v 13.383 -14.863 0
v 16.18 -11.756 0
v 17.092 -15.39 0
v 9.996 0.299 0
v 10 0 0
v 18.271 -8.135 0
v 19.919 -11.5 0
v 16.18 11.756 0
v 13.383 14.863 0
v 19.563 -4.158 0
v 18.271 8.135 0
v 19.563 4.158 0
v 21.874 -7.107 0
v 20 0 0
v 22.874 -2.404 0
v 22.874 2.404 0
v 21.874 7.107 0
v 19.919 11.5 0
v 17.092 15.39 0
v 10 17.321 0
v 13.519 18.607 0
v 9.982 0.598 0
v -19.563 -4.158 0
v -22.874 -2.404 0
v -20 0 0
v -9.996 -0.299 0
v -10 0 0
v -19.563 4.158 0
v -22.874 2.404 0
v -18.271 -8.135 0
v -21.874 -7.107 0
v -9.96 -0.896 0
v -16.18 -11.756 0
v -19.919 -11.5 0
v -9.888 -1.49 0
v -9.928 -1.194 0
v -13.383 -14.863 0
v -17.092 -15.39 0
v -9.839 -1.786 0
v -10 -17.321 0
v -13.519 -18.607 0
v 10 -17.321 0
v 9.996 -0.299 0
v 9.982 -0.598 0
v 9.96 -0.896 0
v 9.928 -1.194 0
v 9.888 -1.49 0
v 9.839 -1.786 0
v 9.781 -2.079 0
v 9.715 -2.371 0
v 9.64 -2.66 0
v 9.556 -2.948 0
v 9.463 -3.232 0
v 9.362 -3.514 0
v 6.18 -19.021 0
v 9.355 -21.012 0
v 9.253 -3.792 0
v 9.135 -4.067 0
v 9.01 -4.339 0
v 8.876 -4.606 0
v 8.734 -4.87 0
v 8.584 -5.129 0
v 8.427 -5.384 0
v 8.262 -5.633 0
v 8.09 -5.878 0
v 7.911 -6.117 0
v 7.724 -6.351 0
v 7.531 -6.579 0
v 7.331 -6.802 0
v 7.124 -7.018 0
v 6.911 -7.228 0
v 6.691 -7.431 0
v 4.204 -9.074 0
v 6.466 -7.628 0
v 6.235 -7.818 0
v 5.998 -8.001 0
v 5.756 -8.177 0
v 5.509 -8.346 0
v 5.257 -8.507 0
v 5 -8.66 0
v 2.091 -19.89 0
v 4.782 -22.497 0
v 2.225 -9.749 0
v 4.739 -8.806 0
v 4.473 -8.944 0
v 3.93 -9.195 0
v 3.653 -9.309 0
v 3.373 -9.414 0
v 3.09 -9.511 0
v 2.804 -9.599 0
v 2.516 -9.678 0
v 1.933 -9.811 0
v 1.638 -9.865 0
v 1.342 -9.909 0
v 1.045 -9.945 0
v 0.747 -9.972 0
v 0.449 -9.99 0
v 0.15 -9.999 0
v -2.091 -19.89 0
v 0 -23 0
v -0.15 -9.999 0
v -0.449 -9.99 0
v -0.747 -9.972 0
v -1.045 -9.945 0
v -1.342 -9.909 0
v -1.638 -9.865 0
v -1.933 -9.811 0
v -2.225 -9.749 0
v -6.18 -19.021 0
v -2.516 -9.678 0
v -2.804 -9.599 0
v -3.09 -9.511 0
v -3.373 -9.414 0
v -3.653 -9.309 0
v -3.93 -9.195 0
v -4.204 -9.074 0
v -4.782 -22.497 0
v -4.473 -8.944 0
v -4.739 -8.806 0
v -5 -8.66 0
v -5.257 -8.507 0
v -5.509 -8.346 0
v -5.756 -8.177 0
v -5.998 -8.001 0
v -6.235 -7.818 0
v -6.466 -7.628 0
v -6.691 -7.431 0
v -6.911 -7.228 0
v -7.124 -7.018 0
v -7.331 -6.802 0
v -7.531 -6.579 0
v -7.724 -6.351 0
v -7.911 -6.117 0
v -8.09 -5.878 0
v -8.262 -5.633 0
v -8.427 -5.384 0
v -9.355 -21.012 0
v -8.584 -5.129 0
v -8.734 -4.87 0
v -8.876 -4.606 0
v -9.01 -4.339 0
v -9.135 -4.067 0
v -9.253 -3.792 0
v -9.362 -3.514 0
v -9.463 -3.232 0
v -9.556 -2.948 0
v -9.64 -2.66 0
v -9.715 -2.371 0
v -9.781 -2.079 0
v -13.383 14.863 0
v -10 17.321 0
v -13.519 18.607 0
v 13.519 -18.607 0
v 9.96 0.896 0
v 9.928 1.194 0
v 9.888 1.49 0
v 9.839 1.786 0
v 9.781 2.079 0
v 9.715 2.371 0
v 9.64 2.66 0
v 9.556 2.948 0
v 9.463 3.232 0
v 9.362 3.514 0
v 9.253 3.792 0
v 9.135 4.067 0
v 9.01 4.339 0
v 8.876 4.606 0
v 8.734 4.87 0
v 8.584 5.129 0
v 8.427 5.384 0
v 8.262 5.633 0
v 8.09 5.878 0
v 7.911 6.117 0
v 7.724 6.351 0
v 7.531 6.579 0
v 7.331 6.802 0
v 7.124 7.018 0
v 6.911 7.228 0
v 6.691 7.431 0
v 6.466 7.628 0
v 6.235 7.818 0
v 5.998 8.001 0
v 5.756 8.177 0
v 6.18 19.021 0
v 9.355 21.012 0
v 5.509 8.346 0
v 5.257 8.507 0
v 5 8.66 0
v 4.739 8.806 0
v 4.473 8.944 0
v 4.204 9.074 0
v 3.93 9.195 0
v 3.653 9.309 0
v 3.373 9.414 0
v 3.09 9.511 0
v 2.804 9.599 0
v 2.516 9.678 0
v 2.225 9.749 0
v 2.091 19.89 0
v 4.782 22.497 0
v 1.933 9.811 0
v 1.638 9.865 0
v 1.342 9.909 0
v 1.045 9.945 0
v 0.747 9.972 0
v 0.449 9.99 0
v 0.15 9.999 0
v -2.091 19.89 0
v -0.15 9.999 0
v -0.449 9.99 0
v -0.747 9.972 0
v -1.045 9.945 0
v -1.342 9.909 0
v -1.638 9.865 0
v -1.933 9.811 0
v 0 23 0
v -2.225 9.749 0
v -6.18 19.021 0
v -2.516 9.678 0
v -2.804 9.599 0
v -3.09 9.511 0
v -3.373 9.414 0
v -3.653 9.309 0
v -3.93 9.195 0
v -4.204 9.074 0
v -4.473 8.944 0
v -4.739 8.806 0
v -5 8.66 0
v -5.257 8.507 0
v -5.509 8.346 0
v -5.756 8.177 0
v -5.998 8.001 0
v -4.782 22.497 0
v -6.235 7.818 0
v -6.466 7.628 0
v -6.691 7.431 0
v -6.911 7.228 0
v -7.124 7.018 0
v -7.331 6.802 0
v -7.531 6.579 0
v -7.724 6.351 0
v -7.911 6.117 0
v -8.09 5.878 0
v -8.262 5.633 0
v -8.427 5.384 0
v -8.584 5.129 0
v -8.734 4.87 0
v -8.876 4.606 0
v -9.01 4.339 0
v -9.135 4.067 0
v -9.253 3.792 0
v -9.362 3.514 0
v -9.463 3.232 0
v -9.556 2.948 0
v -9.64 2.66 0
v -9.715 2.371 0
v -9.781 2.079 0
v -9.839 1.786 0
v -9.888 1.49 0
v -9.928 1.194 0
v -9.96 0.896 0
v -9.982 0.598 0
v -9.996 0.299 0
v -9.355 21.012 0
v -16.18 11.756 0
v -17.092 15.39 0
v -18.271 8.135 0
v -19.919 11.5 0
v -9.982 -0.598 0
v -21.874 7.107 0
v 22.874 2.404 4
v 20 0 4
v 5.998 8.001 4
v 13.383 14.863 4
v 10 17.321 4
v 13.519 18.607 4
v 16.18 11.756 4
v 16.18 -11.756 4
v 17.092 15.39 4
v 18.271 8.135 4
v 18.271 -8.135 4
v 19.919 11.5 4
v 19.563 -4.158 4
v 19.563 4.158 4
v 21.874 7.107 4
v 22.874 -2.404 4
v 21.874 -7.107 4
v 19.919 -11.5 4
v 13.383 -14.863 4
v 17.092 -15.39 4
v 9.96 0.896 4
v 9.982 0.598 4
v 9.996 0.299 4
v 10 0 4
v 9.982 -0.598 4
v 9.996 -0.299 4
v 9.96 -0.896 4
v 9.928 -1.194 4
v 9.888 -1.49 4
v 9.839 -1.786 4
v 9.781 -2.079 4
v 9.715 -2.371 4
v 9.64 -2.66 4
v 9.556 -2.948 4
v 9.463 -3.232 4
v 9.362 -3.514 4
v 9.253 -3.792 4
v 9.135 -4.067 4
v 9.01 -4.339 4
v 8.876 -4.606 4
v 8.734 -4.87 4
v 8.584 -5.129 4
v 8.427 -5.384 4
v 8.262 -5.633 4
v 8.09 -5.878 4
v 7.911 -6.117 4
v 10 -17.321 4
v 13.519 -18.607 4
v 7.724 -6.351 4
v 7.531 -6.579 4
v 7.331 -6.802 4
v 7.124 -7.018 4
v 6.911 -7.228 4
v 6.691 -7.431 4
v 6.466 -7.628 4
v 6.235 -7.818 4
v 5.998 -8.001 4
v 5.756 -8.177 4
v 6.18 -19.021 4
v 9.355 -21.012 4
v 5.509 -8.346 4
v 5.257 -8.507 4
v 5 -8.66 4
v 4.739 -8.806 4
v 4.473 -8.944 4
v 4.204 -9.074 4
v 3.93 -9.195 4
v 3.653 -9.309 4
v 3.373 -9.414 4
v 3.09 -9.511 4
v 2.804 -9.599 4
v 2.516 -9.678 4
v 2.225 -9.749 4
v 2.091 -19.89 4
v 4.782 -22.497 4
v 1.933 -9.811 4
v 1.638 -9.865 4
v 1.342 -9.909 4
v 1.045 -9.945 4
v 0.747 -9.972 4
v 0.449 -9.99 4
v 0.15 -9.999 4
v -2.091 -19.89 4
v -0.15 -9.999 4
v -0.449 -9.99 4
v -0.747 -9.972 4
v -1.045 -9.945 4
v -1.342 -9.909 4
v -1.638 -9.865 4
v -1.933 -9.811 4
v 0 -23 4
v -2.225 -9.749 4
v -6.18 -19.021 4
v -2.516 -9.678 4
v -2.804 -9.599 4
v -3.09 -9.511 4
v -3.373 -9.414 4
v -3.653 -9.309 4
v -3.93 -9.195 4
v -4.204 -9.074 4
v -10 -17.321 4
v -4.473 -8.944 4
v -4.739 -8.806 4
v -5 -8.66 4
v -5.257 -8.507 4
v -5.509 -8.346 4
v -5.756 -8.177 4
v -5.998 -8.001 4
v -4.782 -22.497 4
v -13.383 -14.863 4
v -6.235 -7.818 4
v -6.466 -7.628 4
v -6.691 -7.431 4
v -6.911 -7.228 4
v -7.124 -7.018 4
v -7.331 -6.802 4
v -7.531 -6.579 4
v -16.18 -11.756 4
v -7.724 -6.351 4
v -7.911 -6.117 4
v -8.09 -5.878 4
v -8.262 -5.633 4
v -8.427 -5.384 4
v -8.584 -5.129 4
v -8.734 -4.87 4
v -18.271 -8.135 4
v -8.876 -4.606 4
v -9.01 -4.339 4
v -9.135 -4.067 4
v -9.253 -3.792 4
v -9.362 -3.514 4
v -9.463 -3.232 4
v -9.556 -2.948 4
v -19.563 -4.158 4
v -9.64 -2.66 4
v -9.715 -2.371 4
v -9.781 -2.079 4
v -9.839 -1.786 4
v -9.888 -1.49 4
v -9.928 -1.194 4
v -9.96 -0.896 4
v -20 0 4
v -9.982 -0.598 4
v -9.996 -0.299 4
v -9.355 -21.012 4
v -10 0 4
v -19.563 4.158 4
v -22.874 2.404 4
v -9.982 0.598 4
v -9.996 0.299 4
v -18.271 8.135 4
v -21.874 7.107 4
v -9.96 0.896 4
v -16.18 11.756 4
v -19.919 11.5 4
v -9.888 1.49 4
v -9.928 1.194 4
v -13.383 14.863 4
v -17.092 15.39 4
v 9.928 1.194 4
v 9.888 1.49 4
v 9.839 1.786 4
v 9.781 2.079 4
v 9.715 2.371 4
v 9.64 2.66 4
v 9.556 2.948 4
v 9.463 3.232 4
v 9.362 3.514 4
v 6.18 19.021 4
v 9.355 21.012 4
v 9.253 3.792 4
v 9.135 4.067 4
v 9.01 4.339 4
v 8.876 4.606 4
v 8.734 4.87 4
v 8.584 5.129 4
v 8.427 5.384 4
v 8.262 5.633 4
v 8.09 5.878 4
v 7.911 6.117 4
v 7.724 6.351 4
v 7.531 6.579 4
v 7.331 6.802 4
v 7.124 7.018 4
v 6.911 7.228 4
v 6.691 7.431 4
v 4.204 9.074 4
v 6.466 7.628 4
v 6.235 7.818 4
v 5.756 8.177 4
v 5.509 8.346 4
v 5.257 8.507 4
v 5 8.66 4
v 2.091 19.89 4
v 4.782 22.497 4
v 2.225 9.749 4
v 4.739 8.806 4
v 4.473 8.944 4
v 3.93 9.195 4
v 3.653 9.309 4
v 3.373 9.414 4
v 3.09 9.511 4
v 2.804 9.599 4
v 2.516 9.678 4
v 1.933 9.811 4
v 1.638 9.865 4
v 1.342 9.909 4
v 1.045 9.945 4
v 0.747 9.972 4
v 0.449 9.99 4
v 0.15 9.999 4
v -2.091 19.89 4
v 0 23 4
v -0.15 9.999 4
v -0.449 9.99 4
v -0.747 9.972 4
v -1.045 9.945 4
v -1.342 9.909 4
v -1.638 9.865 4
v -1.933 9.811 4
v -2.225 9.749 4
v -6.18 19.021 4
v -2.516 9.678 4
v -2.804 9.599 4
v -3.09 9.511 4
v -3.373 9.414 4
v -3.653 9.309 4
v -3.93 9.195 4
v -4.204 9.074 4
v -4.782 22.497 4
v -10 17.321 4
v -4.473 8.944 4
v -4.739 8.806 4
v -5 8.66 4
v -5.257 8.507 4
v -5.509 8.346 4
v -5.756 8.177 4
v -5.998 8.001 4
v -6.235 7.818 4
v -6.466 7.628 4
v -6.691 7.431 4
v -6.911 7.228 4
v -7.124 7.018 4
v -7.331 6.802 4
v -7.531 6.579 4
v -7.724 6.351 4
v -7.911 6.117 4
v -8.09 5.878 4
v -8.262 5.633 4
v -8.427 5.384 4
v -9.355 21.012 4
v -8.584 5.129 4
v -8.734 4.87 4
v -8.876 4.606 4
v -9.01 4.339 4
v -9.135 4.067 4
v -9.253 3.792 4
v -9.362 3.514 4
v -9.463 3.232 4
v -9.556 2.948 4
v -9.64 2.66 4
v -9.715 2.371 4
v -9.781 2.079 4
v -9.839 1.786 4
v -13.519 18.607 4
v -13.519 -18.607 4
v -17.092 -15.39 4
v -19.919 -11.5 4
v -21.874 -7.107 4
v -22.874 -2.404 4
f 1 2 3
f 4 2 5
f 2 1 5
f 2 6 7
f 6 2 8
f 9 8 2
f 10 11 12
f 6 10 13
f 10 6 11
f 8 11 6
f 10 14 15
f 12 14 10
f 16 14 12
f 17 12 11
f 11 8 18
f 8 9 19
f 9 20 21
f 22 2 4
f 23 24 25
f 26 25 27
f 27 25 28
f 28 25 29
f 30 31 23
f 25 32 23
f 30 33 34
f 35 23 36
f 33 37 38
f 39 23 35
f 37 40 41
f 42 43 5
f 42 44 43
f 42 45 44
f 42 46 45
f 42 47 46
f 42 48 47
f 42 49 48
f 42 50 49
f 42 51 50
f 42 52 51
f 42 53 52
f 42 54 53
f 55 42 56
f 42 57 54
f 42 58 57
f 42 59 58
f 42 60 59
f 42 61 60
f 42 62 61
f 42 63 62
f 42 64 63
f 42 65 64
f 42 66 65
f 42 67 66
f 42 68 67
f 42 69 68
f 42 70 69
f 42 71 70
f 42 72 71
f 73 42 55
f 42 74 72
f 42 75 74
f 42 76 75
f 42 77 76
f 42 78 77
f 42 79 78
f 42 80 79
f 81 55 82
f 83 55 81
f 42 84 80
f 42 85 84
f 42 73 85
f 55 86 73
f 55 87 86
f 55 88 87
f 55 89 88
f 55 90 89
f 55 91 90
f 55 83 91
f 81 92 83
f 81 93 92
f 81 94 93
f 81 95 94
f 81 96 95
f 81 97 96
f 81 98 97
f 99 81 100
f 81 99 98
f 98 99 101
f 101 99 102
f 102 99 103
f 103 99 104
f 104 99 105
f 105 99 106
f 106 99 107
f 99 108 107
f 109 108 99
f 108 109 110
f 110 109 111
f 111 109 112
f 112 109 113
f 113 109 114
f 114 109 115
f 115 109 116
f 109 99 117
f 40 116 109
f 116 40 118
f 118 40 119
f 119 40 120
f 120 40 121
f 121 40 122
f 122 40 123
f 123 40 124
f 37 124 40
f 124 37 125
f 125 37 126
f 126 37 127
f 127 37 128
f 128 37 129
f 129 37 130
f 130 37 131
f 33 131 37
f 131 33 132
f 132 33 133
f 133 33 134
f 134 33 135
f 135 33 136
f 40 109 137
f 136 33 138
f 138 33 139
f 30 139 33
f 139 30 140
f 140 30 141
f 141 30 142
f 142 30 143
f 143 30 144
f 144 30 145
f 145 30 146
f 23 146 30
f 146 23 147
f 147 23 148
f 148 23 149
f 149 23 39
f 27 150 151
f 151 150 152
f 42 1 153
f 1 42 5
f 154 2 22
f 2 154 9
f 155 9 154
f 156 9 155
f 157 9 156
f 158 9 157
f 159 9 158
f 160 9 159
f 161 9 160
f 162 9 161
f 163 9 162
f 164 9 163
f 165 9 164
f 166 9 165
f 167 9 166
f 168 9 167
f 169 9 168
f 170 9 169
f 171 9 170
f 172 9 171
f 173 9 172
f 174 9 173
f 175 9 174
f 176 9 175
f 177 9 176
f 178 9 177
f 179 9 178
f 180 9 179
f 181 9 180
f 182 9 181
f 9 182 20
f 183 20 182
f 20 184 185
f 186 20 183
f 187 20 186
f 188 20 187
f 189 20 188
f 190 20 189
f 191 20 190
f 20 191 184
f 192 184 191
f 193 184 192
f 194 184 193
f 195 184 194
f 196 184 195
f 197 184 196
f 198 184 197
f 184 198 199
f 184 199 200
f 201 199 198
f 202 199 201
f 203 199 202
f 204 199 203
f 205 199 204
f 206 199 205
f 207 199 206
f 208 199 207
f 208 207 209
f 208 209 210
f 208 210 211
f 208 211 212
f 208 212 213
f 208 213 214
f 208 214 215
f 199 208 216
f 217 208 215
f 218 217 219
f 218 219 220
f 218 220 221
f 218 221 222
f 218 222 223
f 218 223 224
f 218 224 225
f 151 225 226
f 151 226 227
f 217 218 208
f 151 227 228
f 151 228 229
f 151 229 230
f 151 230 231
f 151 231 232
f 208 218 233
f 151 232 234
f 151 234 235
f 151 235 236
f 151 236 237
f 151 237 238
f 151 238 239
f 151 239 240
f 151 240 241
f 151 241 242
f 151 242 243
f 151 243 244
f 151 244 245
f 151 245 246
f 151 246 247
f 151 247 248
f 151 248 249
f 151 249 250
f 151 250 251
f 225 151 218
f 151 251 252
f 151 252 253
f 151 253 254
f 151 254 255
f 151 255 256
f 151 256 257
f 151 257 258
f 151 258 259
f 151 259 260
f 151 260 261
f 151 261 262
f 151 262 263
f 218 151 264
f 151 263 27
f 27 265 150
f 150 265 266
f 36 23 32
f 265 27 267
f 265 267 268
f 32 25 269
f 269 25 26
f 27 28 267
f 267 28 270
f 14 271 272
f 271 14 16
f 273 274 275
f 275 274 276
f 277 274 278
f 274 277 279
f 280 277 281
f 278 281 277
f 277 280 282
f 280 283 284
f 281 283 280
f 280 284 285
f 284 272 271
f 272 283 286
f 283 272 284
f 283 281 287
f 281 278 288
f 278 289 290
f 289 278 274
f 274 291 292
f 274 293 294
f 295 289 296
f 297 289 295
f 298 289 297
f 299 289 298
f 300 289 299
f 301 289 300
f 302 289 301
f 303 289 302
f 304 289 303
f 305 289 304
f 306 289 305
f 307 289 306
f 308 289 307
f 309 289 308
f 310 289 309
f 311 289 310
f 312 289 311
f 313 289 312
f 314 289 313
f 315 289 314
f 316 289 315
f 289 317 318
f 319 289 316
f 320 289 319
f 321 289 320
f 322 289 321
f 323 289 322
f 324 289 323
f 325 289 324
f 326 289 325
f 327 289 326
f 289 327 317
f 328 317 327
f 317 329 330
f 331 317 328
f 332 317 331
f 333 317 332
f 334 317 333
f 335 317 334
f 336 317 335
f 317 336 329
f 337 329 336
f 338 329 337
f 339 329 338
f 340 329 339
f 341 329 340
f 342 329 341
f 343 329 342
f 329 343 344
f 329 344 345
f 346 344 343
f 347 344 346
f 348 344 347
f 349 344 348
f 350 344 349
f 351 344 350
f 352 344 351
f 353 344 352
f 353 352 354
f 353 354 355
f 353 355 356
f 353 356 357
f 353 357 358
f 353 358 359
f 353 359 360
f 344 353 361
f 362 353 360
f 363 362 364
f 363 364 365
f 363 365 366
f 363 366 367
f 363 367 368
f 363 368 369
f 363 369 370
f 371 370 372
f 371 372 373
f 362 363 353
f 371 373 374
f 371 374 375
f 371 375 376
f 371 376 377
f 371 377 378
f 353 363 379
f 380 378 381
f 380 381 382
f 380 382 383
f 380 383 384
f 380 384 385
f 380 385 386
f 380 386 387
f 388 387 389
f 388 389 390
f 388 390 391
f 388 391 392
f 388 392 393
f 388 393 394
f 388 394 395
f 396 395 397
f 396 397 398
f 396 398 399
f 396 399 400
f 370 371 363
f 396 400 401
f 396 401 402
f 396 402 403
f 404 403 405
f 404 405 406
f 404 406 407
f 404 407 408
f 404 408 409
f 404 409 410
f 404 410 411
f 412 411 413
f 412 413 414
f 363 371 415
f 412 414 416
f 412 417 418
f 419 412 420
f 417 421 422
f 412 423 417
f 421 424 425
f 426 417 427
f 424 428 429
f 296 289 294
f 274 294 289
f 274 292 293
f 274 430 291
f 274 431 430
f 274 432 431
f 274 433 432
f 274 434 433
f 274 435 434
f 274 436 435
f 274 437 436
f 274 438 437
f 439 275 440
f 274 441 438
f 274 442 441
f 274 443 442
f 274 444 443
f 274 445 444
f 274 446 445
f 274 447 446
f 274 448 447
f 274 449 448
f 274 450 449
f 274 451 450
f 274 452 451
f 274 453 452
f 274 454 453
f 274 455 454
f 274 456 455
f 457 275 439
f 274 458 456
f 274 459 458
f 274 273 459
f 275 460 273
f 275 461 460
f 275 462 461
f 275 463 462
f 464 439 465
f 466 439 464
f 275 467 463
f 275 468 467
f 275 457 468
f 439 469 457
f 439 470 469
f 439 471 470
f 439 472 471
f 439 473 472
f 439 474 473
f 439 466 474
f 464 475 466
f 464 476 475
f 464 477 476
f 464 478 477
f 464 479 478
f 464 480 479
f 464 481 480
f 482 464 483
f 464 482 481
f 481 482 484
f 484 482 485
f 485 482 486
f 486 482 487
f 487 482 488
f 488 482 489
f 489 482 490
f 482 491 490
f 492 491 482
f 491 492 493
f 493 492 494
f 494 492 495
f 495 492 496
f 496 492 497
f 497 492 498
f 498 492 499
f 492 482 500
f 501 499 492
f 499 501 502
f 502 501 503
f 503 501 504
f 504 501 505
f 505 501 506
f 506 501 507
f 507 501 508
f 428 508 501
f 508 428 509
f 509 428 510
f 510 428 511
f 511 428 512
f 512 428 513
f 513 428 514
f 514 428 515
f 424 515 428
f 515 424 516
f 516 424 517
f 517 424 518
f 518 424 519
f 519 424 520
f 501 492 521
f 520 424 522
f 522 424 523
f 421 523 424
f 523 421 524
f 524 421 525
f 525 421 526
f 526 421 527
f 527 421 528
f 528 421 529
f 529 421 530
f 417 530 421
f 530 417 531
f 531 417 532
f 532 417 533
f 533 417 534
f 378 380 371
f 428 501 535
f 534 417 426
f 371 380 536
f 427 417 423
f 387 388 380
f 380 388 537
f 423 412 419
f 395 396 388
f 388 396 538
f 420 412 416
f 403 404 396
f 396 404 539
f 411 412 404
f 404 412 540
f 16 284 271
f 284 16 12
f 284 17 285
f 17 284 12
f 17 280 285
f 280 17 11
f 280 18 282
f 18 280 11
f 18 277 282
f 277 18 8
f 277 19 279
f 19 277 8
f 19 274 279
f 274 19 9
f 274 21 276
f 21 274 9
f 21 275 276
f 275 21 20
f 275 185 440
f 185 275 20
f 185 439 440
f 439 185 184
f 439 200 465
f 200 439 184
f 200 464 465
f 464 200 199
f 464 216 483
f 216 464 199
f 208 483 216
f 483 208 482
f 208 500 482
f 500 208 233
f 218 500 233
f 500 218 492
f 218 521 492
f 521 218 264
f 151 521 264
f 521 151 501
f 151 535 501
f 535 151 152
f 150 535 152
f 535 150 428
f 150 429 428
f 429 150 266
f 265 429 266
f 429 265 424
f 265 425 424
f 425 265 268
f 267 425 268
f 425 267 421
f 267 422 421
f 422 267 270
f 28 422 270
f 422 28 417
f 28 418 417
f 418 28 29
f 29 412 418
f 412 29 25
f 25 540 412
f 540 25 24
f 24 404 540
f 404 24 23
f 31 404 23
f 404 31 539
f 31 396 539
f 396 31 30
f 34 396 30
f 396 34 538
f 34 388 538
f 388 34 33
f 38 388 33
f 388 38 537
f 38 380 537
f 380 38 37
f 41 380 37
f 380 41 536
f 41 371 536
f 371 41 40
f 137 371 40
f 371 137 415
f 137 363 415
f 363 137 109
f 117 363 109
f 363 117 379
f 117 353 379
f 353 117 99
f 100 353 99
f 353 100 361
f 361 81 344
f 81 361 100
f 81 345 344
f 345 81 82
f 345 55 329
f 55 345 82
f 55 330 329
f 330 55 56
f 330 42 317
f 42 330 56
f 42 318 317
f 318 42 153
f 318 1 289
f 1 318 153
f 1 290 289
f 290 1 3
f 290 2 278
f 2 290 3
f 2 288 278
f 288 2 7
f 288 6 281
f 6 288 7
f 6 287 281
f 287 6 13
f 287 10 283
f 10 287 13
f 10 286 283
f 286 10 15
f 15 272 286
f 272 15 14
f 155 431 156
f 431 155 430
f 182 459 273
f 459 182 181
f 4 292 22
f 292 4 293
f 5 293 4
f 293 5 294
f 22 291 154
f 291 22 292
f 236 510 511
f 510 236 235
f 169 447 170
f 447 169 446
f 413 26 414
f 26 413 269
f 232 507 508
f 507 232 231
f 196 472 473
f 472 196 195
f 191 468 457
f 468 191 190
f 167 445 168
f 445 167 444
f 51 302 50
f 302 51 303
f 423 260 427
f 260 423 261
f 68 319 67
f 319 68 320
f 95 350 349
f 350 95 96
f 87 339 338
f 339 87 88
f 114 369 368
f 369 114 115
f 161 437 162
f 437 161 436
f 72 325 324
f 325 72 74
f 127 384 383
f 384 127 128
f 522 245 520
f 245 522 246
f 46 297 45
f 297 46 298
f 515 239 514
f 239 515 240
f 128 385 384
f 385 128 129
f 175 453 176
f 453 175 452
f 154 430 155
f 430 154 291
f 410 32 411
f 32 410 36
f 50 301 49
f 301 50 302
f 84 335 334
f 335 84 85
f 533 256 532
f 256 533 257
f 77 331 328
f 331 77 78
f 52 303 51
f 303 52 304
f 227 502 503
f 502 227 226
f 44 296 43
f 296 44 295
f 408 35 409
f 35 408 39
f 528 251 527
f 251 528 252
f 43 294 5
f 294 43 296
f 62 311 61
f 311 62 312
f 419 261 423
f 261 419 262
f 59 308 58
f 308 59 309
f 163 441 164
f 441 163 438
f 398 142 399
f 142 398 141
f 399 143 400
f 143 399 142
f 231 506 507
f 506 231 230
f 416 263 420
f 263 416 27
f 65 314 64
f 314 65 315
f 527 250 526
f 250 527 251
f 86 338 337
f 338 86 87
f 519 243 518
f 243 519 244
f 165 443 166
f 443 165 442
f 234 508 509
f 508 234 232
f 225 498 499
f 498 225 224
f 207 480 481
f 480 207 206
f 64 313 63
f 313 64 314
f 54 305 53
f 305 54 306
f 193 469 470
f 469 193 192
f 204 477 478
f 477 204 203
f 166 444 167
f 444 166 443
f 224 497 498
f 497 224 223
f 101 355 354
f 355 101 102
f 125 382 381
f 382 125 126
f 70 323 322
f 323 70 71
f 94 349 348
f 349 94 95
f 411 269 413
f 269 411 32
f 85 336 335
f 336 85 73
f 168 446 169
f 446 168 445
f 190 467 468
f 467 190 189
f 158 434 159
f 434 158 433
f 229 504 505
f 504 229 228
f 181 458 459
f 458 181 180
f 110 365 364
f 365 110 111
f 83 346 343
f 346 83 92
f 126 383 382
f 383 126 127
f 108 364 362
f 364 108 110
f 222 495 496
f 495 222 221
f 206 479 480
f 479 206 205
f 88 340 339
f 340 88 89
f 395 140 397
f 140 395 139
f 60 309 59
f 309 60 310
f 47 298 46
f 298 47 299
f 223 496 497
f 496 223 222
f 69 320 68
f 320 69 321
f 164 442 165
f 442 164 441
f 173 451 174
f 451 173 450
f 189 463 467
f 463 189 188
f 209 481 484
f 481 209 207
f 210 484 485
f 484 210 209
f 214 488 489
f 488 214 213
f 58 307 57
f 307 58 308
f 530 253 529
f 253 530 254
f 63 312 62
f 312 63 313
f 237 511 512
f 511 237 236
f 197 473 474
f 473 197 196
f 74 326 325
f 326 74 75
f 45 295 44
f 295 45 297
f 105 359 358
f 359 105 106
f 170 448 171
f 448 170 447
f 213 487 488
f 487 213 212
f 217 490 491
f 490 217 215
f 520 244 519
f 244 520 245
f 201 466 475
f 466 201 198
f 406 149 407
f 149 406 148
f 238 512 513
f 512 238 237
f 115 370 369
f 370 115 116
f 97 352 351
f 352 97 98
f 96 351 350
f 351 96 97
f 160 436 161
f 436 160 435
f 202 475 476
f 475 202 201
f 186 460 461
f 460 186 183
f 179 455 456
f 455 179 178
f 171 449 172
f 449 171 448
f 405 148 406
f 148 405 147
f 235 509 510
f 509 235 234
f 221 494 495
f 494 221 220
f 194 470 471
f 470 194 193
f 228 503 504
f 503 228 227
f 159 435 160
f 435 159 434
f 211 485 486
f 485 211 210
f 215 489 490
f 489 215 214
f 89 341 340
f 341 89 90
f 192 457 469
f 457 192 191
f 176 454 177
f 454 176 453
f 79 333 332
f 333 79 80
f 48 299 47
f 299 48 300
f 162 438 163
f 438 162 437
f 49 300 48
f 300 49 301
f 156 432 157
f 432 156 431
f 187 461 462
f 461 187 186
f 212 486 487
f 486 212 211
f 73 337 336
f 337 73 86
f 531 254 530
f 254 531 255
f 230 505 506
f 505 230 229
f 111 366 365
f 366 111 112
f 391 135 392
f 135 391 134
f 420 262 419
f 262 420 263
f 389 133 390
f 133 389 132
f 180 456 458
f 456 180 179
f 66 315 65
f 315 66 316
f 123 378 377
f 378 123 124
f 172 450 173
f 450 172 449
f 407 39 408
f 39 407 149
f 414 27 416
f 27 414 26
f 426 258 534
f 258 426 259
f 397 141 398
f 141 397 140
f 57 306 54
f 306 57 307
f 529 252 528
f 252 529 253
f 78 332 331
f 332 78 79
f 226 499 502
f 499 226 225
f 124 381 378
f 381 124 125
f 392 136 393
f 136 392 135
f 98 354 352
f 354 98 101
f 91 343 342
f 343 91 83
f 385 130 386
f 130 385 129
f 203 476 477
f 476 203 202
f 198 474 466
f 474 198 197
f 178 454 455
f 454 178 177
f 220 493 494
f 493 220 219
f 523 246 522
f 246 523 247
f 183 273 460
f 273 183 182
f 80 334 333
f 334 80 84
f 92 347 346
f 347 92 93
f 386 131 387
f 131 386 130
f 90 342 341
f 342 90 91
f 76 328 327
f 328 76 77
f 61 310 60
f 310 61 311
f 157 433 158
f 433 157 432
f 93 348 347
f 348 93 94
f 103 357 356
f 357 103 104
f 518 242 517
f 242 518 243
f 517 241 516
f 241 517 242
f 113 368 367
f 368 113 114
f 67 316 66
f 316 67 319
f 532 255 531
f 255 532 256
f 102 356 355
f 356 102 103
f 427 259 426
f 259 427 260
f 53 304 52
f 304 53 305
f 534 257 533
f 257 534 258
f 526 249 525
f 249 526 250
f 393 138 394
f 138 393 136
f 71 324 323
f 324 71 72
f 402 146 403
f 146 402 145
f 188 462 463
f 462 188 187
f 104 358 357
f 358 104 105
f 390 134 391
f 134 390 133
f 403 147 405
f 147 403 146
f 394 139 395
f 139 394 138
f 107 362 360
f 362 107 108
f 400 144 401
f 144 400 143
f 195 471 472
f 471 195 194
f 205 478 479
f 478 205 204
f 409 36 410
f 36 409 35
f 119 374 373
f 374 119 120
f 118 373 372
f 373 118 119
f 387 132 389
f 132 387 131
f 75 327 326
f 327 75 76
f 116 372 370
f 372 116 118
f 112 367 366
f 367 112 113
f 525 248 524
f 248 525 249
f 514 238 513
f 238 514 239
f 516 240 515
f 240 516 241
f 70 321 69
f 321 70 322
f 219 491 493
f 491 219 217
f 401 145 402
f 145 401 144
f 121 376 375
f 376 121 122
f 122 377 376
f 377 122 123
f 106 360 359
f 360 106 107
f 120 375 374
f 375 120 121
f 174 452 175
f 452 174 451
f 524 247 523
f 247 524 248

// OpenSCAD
$fs = 0.3;
$fa = 1;

module gear(height, radius, teeth_depth, teeth=30) {
	cylinder(h=height, r=radius, $fn=teeth);
	for(tooth = [0:teeth]) {
		rotate([0, 0, tooth * 360 / teeth]) {
			linear_extrude(height=height) {
				polygon(points=[[radius, 0], [cos(360 / teeth) * radius, sin(360 / teeth) * radius], [cos(180 / teeth) * (radius + teeth_depth), sin(180 / teeth) * (radius + teeth_depth)]], convexity=1);
			}
		}
	}
}

difference() {
	gear(height=4, radius=20, teeth_depth=3);
	translate([0, 0, -1]) {
		cylinder(r=10, h=6);
	}
}
